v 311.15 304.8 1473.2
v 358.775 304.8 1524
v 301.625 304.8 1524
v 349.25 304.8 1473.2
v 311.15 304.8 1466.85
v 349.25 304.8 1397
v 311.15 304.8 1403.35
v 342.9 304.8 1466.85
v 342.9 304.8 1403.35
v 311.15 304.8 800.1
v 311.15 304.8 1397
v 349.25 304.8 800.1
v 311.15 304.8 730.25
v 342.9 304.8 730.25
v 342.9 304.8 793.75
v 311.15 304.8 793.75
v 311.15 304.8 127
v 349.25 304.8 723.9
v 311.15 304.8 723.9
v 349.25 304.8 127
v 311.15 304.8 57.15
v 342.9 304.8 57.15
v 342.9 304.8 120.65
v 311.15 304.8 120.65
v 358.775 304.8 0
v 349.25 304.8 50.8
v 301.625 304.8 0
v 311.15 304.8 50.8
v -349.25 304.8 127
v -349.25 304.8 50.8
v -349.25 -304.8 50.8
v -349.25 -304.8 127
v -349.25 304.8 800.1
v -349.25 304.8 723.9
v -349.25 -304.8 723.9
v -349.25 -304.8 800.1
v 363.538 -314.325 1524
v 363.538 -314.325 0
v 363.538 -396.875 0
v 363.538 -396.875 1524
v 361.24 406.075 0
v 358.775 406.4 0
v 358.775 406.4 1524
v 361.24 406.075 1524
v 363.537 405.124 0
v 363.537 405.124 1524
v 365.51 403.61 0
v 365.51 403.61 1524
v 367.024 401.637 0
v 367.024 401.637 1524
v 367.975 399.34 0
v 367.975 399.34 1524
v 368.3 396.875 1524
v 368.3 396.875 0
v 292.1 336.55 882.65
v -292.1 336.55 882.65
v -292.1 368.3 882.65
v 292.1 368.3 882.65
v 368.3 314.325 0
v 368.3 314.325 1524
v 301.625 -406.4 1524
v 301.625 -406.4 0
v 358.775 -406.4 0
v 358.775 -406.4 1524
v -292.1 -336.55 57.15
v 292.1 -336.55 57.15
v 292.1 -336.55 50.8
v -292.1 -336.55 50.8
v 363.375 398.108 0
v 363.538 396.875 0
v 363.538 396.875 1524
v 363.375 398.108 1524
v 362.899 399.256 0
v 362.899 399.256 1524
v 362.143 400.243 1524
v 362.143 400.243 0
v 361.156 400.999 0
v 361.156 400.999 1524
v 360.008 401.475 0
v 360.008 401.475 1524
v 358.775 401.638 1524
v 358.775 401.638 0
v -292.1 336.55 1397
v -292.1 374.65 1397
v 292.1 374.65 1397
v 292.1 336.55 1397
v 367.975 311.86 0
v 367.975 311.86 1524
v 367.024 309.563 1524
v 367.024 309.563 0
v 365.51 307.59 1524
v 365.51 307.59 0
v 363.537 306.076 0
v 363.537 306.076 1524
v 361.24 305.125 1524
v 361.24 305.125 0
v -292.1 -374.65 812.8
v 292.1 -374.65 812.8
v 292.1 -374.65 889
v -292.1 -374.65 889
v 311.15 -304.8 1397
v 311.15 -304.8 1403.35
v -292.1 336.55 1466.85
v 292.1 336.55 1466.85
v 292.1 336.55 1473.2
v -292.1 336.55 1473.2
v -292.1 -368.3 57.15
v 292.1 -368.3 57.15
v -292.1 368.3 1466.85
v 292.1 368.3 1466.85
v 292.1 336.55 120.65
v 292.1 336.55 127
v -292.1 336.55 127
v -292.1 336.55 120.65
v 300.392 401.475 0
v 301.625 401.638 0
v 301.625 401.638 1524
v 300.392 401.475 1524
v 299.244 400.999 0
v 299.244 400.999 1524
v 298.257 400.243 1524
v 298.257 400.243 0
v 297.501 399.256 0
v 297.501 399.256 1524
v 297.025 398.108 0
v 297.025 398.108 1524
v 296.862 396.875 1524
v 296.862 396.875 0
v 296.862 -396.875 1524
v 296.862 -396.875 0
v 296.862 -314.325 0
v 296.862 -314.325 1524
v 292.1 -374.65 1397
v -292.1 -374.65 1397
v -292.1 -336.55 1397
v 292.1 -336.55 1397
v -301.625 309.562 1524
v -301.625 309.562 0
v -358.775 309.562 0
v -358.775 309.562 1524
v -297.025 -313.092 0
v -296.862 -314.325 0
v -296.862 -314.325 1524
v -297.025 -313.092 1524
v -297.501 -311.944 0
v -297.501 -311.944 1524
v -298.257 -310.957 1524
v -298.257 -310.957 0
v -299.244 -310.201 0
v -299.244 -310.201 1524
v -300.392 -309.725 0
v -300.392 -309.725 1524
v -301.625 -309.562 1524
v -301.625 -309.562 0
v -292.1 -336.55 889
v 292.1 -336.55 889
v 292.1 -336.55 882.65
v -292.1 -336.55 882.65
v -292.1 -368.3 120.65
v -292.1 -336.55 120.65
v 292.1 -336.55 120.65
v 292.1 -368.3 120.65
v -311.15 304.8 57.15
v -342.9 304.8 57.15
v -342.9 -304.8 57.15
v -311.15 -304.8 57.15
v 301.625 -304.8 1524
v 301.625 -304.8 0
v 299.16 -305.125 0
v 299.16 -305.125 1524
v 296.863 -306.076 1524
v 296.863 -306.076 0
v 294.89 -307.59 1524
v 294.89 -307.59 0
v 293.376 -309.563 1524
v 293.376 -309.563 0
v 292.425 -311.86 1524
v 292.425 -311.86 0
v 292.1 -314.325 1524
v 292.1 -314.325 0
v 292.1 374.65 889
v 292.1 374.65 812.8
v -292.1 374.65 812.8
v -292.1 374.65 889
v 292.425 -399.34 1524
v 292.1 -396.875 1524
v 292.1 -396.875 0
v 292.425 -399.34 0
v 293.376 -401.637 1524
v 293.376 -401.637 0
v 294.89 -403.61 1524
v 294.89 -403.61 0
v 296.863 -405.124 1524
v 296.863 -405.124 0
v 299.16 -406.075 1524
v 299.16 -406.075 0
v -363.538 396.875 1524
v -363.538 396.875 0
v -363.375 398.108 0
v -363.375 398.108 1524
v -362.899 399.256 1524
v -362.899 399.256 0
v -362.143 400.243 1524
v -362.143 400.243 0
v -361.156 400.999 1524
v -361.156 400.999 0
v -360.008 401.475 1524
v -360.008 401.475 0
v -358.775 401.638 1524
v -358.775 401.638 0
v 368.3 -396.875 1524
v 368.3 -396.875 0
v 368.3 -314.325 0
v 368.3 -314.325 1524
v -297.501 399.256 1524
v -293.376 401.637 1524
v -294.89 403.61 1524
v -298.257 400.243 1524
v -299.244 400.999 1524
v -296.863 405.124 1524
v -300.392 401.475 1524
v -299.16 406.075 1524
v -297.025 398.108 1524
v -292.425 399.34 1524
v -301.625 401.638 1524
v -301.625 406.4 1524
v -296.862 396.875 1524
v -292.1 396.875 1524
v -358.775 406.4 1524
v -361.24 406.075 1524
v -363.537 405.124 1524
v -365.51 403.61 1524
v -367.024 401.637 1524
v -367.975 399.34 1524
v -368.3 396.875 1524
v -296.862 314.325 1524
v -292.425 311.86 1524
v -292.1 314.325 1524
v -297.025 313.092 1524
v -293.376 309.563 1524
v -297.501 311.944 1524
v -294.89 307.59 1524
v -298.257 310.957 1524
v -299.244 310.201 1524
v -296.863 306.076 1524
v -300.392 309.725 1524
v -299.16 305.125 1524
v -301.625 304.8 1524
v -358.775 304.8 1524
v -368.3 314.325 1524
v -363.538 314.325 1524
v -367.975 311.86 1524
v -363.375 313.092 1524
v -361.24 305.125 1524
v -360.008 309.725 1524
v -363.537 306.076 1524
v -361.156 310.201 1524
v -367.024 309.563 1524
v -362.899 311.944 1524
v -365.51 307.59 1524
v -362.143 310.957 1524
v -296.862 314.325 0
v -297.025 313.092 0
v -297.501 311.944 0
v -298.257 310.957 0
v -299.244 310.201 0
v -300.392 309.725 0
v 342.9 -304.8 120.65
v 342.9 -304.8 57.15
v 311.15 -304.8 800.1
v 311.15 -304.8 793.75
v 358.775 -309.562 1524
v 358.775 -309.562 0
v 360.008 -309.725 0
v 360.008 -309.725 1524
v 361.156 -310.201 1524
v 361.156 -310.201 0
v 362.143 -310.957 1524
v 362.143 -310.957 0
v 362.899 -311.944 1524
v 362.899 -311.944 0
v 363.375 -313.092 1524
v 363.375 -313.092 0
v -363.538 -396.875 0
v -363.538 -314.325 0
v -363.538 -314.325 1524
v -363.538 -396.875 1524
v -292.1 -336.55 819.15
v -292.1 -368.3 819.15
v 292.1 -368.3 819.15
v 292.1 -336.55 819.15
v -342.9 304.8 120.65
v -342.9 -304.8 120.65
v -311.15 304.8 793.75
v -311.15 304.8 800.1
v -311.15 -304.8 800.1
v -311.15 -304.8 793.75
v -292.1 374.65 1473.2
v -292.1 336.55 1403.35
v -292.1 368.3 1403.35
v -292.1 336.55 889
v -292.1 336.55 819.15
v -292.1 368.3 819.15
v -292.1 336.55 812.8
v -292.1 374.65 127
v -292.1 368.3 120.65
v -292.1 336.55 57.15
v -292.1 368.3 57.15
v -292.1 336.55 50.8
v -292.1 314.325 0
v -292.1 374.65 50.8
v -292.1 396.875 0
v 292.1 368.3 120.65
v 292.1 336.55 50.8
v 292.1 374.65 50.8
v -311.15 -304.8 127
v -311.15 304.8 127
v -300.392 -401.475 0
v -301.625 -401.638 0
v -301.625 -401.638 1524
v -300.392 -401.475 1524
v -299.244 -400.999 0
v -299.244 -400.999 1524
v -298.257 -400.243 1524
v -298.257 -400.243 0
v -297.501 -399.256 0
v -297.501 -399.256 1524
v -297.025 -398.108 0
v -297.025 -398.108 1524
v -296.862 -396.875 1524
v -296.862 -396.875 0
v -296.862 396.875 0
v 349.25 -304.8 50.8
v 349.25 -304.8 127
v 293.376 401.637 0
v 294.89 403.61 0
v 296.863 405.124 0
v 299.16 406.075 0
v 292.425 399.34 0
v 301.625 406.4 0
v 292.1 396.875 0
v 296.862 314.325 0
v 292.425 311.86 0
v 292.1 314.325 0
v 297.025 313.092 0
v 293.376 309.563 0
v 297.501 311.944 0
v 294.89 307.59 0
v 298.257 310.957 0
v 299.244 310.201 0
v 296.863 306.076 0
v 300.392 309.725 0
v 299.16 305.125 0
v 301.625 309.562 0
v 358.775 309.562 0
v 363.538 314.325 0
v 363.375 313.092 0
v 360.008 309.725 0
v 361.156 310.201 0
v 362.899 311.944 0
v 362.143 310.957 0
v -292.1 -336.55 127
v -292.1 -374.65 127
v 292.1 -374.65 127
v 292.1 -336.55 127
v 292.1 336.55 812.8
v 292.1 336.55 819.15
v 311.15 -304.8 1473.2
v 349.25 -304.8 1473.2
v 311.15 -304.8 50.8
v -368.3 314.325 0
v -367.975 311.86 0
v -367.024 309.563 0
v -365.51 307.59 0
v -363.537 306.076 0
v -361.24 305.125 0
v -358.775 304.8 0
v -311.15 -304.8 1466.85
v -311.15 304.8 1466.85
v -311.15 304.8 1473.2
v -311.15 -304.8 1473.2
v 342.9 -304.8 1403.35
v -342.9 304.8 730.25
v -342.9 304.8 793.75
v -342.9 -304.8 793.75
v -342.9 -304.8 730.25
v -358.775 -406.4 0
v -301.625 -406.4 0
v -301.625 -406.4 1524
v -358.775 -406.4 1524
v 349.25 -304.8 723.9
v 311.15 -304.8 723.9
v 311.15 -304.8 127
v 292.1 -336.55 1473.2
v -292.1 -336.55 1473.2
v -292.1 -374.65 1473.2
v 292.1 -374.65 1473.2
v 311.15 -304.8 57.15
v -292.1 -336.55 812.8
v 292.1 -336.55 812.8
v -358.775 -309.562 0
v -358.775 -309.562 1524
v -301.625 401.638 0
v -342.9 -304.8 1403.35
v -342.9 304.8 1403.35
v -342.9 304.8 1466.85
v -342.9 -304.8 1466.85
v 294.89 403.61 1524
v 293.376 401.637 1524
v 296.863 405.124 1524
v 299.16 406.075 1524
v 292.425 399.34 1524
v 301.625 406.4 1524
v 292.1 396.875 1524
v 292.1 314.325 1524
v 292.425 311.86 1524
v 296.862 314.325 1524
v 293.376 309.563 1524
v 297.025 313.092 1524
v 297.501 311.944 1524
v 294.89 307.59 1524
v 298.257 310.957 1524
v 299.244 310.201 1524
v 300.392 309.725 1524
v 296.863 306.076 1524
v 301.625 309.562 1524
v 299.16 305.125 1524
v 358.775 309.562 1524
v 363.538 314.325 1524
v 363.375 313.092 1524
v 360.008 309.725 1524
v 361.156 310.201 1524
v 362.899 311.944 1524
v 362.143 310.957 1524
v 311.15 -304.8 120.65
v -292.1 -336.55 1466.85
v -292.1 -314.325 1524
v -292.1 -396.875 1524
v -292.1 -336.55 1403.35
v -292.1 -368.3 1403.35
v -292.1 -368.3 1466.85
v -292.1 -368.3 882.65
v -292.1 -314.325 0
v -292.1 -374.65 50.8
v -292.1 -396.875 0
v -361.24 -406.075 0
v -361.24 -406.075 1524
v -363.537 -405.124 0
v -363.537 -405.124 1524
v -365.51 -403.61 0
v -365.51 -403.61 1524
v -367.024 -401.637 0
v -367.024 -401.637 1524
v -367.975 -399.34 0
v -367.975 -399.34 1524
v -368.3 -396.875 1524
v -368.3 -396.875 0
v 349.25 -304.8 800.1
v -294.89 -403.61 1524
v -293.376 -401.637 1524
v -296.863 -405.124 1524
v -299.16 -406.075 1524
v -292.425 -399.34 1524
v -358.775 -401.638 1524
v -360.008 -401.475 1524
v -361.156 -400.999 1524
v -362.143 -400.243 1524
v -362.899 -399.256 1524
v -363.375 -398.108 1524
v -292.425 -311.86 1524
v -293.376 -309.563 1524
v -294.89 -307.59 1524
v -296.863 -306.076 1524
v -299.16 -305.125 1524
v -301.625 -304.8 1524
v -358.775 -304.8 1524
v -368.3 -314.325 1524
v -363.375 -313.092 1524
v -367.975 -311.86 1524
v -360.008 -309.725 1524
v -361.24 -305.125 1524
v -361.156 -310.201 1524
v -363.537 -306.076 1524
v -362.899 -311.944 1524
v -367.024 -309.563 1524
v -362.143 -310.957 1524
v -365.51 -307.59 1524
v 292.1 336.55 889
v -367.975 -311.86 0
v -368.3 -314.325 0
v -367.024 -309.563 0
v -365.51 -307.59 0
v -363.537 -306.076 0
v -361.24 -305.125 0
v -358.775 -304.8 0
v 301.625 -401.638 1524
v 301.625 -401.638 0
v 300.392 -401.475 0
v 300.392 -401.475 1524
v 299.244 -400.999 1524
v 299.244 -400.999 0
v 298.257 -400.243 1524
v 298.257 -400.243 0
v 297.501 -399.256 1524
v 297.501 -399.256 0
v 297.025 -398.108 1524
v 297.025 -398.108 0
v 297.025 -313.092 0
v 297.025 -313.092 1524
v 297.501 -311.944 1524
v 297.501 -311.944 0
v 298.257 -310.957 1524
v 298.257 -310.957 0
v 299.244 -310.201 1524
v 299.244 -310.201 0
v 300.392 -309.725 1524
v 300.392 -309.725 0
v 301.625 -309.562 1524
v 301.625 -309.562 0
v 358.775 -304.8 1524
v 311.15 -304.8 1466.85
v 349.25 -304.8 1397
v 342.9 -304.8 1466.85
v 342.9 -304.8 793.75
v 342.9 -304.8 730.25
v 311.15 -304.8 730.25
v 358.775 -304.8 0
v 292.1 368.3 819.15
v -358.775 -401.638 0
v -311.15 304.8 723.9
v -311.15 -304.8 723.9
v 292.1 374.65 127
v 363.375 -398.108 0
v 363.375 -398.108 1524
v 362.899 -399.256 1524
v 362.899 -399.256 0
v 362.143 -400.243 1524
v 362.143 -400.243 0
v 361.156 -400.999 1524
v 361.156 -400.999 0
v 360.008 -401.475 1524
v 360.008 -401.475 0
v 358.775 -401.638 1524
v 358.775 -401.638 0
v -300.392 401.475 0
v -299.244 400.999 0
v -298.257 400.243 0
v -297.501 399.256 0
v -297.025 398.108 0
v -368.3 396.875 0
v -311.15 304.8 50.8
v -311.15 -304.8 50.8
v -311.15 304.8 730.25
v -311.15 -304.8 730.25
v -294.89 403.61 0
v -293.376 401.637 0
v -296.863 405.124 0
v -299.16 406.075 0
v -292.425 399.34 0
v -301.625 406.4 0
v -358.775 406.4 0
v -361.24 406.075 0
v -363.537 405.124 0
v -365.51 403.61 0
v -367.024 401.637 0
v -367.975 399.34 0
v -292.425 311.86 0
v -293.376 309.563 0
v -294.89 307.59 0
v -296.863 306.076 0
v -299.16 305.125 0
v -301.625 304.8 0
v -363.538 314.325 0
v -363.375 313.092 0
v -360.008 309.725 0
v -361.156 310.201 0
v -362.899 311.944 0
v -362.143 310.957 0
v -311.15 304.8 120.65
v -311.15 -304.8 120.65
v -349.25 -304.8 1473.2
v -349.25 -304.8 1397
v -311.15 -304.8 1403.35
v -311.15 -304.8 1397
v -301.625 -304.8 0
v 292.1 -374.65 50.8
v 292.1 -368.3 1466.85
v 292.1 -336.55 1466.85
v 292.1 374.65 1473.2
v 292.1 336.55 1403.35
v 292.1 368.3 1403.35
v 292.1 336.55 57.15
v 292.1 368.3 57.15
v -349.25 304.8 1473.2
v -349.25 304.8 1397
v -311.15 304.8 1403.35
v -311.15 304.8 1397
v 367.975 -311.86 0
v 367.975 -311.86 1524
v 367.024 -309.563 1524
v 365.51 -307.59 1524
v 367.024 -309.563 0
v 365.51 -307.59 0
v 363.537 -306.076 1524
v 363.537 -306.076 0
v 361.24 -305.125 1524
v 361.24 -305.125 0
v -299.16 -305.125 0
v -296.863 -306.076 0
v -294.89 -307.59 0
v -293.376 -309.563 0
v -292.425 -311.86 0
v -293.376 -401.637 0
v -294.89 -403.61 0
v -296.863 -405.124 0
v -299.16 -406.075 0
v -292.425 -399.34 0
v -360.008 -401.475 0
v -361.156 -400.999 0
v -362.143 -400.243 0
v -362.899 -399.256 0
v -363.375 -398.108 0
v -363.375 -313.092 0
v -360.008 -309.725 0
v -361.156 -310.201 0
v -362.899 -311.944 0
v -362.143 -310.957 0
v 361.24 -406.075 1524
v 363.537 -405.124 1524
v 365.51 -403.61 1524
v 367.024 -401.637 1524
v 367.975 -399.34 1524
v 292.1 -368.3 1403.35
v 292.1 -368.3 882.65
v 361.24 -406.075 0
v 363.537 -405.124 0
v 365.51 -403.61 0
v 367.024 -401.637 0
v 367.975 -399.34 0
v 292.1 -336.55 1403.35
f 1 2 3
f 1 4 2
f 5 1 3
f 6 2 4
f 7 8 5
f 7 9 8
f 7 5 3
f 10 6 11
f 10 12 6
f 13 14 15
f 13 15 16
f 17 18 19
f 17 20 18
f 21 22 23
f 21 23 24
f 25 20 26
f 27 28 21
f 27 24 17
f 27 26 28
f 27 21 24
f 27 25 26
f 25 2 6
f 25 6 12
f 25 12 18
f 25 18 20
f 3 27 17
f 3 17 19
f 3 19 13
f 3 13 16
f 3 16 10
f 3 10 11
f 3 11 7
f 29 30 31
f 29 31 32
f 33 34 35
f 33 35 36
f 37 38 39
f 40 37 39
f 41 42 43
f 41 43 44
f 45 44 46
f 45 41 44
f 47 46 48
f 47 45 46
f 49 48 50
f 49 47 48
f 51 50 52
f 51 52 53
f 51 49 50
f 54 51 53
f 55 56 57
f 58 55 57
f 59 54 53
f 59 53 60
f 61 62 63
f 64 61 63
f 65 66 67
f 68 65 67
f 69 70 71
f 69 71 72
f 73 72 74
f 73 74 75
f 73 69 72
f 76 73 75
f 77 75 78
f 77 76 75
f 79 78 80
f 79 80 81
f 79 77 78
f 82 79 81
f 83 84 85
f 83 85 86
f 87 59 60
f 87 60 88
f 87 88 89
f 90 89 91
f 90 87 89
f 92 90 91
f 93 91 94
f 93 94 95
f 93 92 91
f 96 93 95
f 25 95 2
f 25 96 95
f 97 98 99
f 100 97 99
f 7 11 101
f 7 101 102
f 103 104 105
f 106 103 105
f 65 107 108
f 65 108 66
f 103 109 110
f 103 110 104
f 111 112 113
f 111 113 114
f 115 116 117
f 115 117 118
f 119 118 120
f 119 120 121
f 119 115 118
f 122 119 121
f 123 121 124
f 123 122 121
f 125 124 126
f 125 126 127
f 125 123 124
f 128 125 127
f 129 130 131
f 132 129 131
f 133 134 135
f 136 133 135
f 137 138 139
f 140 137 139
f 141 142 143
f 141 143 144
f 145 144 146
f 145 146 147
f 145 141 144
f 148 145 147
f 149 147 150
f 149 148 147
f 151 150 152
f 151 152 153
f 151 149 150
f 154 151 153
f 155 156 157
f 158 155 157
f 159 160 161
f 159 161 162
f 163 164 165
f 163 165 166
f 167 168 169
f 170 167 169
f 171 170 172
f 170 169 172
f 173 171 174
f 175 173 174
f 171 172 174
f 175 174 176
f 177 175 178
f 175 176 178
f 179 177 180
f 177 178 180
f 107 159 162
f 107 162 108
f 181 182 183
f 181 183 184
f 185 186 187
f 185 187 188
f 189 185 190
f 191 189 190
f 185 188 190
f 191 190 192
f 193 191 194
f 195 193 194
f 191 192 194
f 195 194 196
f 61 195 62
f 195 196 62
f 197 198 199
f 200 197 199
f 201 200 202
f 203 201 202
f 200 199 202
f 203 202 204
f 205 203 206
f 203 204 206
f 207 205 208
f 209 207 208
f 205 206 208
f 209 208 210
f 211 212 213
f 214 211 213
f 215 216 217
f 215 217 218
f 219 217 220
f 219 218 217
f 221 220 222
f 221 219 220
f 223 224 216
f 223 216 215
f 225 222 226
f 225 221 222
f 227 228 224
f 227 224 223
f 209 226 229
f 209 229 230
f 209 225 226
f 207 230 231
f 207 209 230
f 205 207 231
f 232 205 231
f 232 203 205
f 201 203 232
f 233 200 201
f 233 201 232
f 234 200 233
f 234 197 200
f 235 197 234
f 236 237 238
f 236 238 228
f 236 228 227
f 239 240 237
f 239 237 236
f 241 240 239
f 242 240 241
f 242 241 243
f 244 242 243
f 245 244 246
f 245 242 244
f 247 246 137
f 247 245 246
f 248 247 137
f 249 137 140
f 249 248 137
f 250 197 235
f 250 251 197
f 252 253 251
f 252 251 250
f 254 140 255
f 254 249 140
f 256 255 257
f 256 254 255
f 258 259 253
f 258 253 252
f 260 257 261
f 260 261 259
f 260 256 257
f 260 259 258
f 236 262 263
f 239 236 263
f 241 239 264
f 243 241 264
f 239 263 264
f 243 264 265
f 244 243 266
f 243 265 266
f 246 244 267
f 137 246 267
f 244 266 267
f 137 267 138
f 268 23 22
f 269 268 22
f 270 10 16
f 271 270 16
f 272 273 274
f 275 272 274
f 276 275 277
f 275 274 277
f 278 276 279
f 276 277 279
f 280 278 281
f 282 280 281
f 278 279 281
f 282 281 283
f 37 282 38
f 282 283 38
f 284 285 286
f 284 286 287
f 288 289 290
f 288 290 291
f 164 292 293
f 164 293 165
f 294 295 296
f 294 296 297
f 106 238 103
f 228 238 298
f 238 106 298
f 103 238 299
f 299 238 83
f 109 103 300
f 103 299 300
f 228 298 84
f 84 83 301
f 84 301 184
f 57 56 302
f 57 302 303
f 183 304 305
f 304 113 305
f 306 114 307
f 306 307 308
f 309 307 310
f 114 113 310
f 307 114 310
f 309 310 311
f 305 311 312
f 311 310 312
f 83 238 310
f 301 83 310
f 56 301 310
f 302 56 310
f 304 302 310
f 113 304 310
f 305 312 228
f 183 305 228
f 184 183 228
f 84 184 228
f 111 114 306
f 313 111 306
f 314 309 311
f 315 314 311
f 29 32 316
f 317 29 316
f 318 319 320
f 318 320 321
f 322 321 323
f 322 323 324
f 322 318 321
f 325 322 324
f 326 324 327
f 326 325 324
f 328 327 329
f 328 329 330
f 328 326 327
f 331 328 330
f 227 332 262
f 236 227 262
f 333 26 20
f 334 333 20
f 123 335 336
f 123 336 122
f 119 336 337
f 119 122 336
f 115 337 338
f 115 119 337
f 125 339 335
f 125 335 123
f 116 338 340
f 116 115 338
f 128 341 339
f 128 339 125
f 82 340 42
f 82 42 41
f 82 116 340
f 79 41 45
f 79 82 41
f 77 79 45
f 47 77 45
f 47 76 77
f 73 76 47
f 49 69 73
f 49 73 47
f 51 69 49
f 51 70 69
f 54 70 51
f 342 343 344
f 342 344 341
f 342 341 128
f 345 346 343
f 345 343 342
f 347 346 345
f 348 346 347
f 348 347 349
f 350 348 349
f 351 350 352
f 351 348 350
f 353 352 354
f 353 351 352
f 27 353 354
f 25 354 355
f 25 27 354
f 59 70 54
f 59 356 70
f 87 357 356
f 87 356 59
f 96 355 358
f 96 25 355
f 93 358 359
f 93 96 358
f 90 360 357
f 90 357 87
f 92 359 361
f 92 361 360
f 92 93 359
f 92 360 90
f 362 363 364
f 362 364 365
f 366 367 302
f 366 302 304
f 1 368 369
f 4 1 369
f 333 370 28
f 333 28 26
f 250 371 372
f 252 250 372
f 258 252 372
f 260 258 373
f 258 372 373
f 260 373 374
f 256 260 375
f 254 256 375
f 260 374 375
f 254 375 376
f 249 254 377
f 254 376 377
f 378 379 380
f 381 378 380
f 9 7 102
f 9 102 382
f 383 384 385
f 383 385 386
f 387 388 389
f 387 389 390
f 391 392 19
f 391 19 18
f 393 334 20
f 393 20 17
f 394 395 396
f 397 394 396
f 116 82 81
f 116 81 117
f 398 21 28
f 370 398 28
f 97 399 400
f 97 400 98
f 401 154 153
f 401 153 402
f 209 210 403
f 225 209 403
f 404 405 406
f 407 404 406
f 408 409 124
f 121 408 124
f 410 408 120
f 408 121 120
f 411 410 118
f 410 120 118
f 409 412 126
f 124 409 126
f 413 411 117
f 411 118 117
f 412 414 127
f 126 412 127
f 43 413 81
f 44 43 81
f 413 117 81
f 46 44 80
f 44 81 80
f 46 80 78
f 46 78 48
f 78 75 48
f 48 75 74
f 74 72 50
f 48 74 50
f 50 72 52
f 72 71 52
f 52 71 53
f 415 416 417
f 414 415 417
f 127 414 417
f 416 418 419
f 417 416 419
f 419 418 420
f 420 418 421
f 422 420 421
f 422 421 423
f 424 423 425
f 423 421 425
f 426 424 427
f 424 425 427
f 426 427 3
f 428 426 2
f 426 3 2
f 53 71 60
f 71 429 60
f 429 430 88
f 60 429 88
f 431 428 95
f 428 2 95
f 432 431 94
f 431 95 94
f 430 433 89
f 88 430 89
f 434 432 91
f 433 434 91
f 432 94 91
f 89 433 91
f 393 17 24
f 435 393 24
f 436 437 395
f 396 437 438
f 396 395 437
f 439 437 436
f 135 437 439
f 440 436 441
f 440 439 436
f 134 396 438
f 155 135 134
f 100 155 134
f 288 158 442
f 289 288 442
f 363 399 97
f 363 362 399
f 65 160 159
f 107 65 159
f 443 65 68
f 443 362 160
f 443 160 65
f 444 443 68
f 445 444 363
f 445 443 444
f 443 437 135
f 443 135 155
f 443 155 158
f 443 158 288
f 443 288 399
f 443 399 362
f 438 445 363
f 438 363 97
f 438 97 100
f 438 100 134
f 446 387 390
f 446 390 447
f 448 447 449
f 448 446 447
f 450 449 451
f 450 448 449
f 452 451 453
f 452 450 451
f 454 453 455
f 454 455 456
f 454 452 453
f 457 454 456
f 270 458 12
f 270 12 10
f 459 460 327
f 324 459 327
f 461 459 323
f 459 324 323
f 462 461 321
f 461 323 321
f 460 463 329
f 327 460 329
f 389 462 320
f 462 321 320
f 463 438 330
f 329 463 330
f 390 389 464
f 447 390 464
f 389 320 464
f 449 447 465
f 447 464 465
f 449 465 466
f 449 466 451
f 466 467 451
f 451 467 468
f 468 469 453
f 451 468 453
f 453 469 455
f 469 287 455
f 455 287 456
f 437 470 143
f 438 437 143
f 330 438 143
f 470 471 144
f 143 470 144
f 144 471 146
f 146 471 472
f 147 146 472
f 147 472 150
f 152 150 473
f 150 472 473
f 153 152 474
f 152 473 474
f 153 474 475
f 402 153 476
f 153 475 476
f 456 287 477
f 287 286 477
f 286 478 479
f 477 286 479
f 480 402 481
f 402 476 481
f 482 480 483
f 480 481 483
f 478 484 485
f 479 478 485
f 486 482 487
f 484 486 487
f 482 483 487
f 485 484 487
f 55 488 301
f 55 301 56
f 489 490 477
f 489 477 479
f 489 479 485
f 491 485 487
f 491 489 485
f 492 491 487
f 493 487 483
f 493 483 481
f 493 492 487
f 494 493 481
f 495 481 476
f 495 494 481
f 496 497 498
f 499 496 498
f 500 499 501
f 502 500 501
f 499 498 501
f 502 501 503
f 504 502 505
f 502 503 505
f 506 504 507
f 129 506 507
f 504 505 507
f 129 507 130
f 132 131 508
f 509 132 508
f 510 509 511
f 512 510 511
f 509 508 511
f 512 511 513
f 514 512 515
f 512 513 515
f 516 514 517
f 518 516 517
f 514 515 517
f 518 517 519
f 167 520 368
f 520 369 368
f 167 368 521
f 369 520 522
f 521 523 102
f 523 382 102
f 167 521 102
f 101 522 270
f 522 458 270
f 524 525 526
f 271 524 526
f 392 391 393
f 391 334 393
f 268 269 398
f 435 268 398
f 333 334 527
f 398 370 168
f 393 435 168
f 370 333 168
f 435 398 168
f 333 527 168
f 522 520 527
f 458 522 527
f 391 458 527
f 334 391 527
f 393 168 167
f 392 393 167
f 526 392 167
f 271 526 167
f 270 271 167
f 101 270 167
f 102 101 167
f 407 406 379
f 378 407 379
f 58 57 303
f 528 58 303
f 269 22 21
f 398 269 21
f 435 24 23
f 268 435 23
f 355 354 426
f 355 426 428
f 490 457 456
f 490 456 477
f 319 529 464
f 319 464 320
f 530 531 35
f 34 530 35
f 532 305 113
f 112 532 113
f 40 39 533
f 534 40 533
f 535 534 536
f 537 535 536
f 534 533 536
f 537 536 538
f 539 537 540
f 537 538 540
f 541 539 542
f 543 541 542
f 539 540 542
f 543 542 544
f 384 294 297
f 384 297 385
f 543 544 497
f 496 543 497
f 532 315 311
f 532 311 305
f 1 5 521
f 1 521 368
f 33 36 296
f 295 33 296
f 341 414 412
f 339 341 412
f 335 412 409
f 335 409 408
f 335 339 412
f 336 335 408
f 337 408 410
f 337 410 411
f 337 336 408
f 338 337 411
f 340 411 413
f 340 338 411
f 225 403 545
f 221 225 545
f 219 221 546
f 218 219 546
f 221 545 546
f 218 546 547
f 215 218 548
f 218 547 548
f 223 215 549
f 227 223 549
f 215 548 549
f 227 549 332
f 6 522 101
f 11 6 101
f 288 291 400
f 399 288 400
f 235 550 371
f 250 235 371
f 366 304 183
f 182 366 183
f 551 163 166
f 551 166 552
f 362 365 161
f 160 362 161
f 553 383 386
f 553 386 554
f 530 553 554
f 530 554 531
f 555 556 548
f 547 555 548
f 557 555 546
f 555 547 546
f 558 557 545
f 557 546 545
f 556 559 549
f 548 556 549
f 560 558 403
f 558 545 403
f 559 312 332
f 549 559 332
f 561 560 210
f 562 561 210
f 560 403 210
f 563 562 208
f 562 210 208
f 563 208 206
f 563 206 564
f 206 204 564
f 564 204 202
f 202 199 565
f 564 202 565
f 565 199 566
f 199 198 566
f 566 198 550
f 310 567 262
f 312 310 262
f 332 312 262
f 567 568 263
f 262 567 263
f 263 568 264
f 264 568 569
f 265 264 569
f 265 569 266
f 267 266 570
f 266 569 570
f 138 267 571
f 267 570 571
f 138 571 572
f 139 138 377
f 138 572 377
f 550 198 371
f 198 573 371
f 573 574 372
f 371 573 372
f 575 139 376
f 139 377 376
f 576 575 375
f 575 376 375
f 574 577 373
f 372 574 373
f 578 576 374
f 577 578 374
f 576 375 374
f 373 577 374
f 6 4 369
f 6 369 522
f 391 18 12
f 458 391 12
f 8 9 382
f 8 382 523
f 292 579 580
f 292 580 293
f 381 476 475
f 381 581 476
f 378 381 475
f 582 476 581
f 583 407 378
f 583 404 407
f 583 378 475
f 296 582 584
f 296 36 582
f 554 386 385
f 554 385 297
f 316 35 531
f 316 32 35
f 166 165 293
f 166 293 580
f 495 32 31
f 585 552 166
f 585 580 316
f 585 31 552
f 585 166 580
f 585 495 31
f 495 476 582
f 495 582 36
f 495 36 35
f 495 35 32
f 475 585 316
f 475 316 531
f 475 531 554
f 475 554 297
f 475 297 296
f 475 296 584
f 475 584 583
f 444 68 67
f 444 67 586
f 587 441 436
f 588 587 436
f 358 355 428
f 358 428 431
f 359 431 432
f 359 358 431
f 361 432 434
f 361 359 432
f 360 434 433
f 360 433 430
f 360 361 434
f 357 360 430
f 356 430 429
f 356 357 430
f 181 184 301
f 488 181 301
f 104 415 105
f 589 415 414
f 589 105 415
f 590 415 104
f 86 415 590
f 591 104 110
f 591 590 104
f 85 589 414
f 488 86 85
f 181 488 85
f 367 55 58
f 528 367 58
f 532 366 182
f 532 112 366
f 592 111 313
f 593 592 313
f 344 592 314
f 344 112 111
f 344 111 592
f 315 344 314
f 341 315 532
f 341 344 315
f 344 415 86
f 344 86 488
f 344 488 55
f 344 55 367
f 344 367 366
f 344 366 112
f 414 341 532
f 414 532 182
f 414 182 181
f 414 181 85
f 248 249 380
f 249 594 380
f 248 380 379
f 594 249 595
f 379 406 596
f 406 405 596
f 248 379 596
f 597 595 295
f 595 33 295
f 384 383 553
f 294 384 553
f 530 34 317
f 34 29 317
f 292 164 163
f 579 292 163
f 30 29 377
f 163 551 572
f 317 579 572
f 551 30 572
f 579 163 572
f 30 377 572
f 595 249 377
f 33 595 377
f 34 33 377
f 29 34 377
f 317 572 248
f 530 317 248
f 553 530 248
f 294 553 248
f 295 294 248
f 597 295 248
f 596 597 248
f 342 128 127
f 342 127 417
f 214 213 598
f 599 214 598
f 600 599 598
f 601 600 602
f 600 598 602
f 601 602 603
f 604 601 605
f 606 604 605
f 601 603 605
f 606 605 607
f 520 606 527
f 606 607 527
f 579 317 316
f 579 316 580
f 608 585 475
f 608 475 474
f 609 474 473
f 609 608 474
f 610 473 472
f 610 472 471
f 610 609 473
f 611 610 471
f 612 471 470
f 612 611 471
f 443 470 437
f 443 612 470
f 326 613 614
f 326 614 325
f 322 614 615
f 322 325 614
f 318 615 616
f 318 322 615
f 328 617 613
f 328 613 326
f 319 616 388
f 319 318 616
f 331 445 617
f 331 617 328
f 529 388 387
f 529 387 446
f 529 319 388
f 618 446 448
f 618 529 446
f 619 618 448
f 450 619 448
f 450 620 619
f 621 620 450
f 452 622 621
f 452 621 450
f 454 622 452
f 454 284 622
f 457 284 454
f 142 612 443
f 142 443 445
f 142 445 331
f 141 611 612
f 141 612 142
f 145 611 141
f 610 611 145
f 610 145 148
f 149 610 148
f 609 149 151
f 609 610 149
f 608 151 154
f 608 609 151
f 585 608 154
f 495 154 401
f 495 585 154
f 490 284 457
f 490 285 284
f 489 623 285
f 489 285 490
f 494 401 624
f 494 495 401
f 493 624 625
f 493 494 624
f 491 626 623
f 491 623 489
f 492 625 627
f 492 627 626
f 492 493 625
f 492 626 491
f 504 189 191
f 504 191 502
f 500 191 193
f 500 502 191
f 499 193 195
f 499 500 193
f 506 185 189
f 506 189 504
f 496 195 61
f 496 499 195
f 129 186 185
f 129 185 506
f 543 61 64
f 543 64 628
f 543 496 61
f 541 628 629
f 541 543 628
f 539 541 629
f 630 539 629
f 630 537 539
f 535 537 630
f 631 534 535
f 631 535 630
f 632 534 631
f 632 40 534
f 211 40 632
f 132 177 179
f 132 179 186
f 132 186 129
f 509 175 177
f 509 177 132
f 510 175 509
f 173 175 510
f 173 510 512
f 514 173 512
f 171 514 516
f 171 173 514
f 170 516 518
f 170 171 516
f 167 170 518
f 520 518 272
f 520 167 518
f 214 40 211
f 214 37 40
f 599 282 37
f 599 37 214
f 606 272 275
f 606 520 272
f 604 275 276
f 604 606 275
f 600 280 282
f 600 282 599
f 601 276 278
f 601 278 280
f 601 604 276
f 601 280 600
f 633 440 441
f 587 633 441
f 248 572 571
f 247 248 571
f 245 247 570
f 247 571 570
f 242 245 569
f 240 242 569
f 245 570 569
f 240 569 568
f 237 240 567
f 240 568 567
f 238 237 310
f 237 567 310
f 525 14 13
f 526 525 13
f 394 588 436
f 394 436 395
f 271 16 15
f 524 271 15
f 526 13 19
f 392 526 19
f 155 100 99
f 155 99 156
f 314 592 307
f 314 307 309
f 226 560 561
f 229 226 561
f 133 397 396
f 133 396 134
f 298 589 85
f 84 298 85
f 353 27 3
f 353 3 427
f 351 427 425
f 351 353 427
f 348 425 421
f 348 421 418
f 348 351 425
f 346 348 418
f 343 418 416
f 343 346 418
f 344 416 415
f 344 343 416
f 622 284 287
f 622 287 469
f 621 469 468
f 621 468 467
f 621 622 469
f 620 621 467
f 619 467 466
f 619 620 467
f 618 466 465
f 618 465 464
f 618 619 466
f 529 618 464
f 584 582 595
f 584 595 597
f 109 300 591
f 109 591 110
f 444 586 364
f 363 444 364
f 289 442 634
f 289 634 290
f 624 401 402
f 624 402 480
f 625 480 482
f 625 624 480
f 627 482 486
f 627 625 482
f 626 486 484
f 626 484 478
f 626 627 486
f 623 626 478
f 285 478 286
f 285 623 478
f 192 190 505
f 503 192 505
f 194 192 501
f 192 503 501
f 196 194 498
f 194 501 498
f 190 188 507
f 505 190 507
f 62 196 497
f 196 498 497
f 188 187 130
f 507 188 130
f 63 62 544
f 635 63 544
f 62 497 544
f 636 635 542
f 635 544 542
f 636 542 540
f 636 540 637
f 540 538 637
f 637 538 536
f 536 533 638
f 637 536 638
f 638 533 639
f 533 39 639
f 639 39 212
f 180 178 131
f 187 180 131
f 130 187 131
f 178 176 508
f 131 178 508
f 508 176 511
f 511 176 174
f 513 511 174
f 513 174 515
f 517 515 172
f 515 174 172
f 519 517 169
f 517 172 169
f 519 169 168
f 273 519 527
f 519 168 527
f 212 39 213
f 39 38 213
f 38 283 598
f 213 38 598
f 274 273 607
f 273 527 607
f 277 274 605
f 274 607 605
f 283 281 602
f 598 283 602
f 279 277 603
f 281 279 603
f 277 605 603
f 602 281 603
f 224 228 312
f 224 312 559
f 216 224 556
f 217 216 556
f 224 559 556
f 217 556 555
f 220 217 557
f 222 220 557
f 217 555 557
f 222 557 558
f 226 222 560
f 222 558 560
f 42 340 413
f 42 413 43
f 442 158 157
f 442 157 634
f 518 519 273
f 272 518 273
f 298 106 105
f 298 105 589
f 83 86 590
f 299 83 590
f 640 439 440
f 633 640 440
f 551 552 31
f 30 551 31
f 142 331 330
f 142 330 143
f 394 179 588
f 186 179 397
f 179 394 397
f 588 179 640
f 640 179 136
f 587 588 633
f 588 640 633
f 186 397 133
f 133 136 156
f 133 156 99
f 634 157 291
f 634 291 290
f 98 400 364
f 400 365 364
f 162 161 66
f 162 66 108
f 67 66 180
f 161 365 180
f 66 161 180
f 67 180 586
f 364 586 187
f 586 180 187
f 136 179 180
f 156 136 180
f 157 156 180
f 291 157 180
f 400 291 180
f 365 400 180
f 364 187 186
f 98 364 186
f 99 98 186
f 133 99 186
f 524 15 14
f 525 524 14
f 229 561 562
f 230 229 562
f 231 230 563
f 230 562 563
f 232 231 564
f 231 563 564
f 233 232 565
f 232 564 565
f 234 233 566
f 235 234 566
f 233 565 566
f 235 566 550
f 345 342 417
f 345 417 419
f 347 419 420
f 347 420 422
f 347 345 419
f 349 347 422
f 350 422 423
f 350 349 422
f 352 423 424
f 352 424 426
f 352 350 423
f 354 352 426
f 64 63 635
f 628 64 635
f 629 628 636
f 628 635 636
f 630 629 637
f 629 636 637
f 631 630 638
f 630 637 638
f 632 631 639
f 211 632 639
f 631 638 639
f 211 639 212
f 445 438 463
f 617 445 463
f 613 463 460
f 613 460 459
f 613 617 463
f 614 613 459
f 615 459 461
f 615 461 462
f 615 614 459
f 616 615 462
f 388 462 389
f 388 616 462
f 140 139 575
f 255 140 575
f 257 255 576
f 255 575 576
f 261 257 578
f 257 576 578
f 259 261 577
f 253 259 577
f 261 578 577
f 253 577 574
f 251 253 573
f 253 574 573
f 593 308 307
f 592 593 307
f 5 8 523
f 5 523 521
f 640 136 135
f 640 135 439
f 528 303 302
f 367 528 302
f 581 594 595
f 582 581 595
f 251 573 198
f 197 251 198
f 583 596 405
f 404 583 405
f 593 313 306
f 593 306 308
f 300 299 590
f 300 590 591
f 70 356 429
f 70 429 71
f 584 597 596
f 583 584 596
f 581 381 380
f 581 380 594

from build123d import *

# Parameters (mm, degrees)
F1_DEPTH  = 1524
F5_DEPTH  = 609.6
F11_DEPTH = 584.2
F16_R     = 71.4113893101
F17_DEPTH = 320.04


with BuildPart() as f1:
    # F0 (on Top) → F1 (new body)
    with BuildSketch(Plane.XY):
        with BuildLine():
            Line((358.775, -304.8), (301.625, -304.8))
            ThreePointArc((301.625, -304.8), (294.8898079092, -307.5898079092), (292.1, -314.325))
            Line((292.1, -314.325), (292.1, -396.875))
            ThreePointArc((292.1, -396.875), (294.8898079092, -403.6101920908), (301.625, -406.4))
            Line((301.625, -406.4), (358.775, -406.4))
            ThreePointArc((358.775, -406.4), (365.5101920908, -403.6101920908), (368.3, -396.875))
            Line((368.3, -396.875), (368.3, -314.325))
            ThreePointArc((368.3, -314.325), (365.5101920908, -307.5898079092), (358.775, -304.8))
        make_face()
        with BuildLine():
            ThreePointArc((296.8625, -314.325), (298.2574039546, -310.9574039546), (301.625, -309.5625))
            Line((301.625, -309.5625), (358.775, -309.5625))
            ThreePointArc((358.775, -309.5625), (362.1425960454, -310.9574039546), (363.5375, -314.325))
            Line((363.5375, -314.325), (363.5375, -396.875))
            ThreePointArc((363.5375, -396.875), (362.1425960454, -400.2425960454), (358.775, -401.6375))
            Line((358.775, -401.6375), (301.625, -401.6375))
            ThreePointArc((301.625, -401.6375), (298.2574039546, -400.2425960454), (296.8625, -396.875))
            Line((296.8625, -396.875), (296.8625, -314.325))
        make_face(mode=Mode.SUBTRACT)
    extrude(amount=F1_DEPTH)


with BuildPart() as f2_1:
    # F2: instance of F1
    add(f1.part.mirror(Plane.XZ))


with BuildPart() as f3_1:
    # F3: instance of F1
    add(f1.part.mirror(Plane.YZ))


with BuildPart() as f3_2:
    # F3: instance of F2_1
    add(f2_1.part.mirror(Plane.YZ))


with BuildPart() as f5:
    # F4 (on face) → F5 (new body)
    with BuildSketch(Plane.XZ.offset(-304.8)):
        Polygon((311.15, 57.15), (311.15, 50.8), (349.25, 50.8), (349.25, 127), (311.15, 127), (311.15, 120.65), (342.9, 120.65), (342.9, 57.15), align=None)
    extrude(amount=F5_DEPTH)


with BuildPart() as f7_1:
    # F7: instance of F5
    add(f5.part.mirror(Plane.XY.offset(762)))


with BuildPart() as f8_1:
    # F8: copy of F5
    add(f5.part.moved(Location((0, 0, 673.1))))


with BuildPart() as f9_1:
    # F9: instance of F8_1
    add(f8_1.part.mirror(Plane.YZ))


with BuildPart() as f9_2:
    # F9: instance of F7_1
    add(f7_1.part.mirror(Plane.YZ))


with BuildPart() as f9_3:
    # F9: instance of F5
    add(f5.part.mirror(Plane.YZ))


with BuildPart() as f11:
    # F10 (on face) → F11 (new body)
    with BuildSketch(Plane(origin=(292.1, 0, 0), x_dir=(0, -1, 0), z_dir=(-1, 0, 0))):
        Polygon((336.55, 57.15), (336.55, 50.8), (374.65, 50.8), (374.65, 127), (336.55, 127), (336.55, 120.65), (368.3, 120.65), (368.3, 57.15), align=None)
    extrude(amount=F11_DEPTH)


with BuildPart() as f12_1:
    # F12: copy of F11
    add(f11.part.moved(Location((0, 0, 762))))


with BuildPart() as f13_1:
    # F13: instance of F11
    add(f11.part.mirror(Plane.XY.offset(762)))


with BuildPart() as f1_1:
    add(f1.part)

    add(f2_1.part)  # F14 merges F2_1

    add(f3_1.part)  # F14 merges F3_1

    add(f3_2.part)  # F14 merges F3_2

    add(f5.part)  # F14 merges F5

    add(f7_1.part)  # F14 merges F7_1

    add(f8_1.part)  # F14 merges F8_1

    add(f9_1.part)  # F14 merges F9_1

    add(f9_2.part)  # F14 merges F9_2

    add(f9_3.part)  # F14 merges F9_3

    add(f11.part)  # F14 merges F11

    add(f12_1.part)  # F14 merges F12_1

    add(f13_1.part)  # F14 merges F13_1
    # F14: F11, F12_1, F13_1 across plane
    add(f11.part.mirror(Plane.XZ))
    add(f12_1.part.mirror(Plane.XZ))
    add(f13_1.part.mirror(Plane.XZ))


with BuildPart() as f17:
    # F16 (on offset) → F17 (new body)
    with BuildSketch(Plane.XZ.offset(501.65)):
        with Locations((0, 351.0118424892)):
            Circle(F16_R)
    extrude(amount=F17_DEPTH)


solid = f1_1.part
